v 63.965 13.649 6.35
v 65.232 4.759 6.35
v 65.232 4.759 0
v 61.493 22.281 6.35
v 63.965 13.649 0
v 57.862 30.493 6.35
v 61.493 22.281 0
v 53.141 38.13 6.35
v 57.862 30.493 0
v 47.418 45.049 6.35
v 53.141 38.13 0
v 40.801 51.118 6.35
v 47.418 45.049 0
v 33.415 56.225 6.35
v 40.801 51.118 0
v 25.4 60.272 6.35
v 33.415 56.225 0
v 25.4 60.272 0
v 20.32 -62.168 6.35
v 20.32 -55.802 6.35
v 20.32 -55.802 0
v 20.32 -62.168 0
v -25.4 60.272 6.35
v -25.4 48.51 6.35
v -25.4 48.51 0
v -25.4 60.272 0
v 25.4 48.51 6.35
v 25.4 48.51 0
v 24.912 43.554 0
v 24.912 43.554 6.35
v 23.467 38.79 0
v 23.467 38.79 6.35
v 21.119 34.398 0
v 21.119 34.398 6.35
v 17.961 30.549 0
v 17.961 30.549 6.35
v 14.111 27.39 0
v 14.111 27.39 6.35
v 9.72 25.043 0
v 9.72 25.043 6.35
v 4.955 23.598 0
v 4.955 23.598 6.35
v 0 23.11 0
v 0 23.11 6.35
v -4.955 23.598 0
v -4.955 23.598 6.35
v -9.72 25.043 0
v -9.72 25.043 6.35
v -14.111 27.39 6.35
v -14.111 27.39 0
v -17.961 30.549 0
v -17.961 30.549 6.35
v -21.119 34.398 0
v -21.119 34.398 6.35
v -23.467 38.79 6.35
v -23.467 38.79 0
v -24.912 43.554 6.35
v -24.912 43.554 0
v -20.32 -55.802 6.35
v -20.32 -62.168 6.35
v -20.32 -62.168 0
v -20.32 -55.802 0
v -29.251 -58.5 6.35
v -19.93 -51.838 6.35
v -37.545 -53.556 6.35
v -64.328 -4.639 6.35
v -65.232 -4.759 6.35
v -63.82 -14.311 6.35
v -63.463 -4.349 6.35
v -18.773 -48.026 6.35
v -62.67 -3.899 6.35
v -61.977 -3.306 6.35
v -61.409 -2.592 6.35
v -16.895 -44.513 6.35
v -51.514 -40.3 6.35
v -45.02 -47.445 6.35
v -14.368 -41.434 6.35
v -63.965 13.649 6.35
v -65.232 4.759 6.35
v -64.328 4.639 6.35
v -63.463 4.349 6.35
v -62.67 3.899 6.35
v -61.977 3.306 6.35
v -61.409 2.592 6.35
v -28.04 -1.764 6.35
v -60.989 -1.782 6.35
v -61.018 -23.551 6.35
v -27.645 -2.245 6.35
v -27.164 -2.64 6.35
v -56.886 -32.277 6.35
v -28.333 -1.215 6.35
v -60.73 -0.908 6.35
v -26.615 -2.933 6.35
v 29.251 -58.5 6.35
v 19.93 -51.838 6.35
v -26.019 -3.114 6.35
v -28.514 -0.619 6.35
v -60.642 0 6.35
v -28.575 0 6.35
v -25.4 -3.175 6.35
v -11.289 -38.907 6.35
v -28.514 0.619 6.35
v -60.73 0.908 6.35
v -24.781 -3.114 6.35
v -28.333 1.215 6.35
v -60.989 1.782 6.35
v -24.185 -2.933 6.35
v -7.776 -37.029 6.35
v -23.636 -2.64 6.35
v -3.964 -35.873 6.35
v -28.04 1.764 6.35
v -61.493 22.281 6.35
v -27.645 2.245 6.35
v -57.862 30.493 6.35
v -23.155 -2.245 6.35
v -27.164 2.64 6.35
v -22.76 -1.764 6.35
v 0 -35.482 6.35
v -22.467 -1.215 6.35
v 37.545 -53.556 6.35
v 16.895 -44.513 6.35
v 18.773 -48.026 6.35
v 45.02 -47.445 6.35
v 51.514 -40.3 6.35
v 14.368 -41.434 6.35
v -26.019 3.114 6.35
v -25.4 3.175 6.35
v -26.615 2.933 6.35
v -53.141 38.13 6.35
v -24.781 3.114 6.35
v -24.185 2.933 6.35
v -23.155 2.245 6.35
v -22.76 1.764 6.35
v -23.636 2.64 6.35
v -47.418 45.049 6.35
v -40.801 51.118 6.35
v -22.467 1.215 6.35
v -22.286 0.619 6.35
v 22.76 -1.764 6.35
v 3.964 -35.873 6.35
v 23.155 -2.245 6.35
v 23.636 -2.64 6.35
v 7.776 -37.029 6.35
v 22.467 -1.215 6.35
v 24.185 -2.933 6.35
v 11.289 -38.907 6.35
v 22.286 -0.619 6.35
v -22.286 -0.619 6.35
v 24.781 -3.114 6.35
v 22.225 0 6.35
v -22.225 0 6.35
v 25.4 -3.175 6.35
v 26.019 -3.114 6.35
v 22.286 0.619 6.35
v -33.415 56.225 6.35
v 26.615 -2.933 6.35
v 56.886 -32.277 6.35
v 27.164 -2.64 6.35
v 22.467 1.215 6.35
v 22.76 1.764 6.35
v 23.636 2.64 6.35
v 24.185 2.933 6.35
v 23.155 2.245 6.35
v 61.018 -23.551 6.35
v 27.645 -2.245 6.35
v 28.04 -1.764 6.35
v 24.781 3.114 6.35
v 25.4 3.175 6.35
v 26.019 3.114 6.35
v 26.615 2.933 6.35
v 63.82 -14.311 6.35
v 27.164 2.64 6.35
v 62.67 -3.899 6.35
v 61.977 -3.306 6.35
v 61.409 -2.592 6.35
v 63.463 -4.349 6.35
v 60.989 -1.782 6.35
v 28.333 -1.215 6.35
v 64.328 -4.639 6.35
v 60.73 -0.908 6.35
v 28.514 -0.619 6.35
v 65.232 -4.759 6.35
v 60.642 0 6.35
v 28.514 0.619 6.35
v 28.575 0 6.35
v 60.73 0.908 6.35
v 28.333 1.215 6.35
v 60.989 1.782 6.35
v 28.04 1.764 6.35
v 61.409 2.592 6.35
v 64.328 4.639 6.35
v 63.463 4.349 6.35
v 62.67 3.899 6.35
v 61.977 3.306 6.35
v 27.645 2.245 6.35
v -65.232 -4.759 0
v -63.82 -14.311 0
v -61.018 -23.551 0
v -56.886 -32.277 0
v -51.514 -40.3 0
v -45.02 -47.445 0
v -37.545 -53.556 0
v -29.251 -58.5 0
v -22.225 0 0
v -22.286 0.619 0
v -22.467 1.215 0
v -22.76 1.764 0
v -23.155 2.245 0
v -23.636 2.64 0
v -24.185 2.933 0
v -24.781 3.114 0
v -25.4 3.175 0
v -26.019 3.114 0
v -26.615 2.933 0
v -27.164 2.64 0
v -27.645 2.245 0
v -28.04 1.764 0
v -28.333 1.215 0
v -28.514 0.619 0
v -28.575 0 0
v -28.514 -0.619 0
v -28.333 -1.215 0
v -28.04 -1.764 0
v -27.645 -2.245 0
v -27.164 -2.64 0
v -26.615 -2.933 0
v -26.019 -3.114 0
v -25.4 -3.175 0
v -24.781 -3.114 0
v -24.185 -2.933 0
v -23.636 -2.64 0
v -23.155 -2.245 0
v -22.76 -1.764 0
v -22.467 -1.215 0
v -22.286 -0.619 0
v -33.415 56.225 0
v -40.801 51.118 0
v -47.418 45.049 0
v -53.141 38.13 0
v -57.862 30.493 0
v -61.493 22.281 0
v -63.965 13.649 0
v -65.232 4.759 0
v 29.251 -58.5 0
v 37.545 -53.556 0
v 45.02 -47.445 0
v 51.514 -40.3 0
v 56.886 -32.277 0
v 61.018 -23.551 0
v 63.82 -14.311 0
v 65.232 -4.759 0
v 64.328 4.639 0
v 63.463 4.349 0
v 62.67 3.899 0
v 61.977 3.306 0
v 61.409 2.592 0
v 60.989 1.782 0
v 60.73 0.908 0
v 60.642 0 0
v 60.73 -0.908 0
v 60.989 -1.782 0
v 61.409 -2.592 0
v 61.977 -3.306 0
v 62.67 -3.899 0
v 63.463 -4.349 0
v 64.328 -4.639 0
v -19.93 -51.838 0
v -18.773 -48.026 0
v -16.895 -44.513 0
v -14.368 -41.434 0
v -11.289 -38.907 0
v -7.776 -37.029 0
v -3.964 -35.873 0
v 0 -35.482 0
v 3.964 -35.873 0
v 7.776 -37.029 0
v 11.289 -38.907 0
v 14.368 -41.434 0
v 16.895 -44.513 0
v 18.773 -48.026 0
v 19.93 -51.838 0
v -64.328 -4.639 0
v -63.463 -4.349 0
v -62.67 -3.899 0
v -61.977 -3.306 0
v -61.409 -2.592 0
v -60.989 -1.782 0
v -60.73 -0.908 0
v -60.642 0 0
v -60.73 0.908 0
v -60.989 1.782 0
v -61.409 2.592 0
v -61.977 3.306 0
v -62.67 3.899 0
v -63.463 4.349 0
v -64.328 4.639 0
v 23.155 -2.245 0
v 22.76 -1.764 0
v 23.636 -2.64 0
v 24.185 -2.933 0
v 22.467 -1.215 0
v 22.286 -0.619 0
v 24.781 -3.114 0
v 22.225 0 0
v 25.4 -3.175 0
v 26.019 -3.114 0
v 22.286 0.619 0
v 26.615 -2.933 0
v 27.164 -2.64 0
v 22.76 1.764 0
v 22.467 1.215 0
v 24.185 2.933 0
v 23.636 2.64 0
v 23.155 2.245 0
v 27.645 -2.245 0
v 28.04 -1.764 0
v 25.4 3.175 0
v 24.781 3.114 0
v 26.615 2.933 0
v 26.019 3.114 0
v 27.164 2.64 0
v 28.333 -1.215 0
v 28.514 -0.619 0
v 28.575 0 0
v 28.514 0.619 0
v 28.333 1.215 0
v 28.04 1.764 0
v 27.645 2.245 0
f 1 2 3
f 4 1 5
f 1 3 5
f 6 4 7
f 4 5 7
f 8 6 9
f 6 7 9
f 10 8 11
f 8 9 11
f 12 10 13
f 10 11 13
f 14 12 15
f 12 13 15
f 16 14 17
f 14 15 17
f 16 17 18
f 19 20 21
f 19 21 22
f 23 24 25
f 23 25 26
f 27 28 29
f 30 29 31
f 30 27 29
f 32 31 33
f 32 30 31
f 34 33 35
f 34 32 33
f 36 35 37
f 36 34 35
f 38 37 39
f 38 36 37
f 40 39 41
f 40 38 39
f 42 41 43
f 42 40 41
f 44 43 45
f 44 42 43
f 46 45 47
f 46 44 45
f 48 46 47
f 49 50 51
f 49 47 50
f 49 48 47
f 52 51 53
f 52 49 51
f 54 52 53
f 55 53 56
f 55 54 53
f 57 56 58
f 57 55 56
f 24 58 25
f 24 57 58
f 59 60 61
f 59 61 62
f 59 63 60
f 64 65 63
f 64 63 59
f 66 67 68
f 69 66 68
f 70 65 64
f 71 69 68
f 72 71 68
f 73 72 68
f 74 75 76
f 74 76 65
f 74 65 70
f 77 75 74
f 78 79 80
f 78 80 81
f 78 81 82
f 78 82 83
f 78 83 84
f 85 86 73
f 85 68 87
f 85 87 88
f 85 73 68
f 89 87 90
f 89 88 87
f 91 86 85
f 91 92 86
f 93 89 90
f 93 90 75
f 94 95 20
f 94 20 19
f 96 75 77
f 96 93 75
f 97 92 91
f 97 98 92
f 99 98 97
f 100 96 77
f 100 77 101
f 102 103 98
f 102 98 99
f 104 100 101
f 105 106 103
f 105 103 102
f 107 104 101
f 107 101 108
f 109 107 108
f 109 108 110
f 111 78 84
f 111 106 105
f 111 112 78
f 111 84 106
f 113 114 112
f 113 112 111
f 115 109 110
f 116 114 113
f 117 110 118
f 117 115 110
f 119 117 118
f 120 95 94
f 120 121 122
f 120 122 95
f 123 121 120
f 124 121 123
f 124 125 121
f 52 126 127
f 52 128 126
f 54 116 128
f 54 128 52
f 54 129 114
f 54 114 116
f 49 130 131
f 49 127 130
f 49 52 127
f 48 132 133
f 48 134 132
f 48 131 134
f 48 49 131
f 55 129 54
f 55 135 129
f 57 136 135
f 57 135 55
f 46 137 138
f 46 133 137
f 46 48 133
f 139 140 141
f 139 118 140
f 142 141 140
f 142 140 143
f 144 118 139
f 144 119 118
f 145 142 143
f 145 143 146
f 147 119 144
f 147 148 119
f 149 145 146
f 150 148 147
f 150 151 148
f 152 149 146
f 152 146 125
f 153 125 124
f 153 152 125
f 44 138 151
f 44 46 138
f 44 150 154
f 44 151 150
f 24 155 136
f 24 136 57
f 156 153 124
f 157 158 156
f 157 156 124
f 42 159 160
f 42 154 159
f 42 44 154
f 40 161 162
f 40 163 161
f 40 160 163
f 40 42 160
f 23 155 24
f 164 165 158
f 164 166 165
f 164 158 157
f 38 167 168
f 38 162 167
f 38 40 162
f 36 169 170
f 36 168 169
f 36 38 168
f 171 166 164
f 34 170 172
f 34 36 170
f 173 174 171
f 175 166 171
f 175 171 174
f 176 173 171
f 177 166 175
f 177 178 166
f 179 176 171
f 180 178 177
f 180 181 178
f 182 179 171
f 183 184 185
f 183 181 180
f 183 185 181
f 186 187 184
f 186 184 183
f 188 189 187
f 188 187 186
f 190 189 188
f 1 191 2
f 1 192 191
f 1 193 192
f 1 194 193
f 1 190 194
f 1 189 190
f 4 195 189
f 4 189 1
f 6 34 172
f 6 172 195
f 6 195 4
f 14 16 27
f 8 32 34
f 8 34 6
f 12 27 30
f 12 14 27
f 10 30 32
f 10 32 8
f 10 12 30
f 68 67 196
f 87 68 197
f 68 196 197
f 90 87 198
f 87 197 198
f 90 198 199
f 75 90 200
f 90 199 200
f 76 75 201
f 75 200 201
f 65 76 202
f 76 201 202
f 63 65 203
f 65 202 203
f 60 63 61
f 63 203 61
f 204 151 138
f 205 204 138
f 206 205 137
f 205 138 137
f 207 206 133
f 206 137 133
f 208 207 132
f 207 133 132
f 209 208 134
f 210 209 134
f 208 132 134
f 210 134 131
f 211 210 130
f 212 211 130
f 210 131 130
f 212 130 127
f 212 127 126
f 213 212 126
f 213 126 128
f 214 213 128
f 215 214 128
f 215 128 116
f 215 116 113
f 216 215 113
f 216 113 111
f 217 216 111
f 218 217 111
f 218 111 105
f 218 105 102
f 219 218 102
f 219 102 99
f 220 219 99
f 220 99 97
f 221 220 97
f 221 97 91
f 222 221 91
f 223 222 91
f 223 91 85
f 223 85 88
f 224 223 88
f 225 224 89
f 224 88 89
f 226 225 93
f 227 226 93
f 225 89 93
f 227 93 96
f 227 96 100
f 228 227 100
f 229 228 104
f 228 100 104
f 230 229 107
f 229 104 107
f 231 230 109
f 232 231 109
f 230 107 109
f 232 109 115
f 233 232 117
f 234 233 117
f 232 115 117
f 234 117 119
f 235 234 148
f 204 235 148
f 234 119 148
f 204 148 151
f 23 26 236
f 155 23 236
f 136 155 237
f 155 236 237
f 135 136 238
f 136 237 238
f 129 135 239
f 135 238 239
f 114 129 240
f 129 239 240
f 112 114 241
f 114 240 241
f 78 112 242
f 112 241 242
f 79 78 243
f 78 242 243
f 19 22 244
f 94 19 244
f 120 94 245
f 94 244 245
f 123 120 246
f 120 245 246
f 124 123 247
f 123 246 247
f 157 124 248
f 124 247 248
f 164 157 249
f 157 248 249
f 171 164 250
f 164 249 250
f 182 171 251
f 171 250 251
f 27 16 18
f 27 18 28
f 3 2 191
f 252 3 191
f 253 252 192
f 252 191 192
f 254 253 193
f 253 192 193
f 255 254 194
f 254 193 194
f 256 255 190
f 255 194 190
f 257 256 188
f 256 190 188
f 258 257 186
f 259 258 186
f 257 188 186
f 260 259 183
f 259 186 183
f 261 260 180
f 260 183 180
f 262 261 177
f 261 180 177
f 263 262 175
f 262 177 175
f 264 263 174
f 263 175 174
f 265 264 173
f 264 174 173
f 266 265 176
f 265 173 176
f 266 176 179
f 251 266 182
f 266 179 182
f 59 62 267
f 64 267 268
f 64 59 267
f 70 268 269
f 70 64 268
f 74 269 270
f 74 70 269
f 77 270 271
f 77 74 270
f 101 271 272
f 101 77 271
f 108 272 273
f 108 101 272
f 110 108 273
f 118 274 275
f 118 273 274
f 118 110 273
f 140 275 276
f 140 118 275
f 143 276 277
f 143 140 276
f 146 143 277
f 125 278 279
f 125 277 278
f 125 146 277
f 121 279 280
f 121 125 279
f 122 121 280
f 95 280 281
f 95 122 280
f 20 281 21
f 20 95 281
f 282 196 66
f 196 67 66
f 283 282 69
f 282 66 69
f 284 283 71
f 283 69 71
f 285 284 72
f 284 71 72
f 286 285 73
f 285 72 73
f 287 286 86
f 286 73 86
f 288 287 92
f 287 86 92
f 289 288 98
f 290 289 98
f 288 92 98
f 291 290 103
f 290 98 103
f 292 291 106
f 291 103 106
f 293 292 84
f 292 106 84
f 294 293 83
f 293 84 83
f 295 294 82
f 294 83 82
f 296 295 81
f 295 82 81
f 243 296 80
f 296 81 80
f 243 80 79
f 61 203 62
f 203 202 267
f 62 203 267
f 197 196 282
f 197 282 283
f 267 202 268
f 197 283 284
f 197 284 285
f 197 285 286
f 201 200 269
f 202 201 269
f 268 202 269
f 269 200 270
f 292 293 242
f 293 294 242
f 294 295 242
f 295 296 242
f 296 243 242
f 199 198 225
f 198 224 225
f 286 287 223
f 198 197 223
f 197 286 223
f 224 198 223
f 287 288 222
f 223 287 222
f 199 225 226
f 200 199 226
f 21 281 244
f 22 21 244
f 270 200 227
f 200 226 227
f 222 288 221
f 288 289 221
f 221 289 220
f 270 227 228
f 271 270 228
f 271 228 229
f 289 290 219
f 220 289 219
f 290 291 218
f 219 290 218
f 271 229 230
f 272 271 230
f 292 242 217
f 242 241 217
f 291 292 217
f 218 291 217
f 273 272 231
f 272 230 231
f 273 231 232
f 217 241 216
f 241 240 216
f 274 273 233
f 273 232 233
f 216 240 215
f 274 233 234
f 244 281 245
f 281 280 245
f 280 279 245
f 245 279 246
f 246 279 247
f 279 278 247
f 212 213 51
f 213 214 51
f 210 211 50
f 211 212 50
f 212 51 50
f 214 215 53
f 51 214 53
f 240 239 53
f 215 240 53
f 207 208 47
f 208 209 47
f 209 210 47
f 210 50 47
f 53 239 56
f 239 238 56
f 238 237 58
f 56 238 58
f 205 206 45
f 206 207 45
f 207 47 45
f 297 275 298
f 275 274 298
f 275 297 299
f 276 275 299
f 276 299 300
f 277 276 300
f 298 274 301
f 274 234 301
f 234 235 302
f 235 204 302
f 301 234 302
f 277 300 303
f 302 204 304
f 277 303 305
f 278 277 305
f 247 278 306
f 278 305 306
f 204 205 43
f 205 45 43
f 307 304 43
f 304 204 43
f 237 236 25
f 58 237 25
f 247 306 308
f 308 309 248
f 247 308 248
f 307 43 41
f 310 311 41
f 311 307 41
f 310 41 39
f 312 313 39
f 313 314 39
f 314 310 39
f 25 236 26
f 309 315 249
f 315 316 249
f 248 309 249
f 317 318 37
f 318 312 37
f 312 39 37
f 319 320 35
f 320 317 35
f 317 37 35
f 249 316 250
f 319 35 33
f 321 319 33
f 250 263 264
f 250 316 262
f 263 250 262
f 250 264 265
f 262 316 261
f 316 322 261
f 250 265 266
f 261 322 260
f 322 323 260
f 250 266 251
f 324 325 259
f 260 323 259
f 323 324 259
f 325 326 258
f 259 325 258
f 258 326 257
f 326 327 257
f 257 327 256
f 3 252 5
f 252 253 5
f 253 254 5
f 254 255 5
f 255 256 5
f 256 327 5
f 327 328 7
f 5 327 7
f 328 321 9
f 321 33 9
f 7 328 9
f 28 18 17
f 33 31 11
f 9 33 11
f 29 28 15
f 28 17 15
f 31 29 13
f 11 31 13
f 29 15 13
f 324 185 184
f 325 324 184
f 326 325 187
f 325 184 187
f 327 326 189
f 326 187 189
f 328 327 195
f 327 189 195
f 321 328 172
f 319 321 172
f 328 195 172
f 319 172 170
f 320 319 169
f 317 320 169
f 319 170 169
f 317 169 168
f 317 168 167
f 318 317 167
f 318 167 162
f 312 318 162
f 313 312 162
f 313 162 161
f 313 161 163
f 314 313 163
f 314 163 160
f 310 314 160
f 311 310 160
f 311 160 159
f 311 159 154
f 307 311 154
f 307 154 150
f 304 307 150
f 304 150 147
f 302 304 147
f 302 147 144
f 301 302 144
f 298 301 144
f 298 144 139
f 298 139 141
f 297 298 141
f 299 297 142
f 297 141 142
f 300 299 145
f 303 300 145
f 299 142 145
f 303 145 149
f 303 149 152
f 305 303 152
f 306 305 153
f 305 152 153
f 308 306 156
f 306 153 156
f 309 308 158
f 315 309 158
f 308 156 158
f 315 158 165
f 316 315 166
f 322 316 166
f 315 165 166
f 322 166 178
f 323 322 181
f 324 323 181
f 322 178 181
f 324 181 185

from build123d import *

# Parameters (mm, degrees)
SKETCH1_R      = 65.405
EXTRUDE1_DEPTH = 6.35
SKETCH2_R      = 4.7625
SKETCH2_R_2    = 3.175
EXTRUDE2_DEPTH = 93.714349213


with BuildPart() as part:
    # Sketch1 → Extrude1 (new body)
    with BuildSketch(Plane.XY):
        Circle(SKETCH1_R)
    extrude(amount=EXTRUDE1_DEPTH)

    # Sketch2 → Extrude2 (cut, through all)
    with BuildSketch(Plane.XY.offset(6.35)):
        with Locations((-65.405, 0)):
            Circle(SKETCH2_R)
        with Locations((65.405, 0)):
            Circle(SKETCH2_R)
        with Locations((25.4, 0)):
            Circle(SKETCH2_R_2)
        with Locations((-25.4, 0)):
            Circle(SKETCH2_R_2)
        with BuildLine():
            Line((-25.4, 48.509773864), (-25.4, 60.271502595))
            Line((-25.4, 60.271502595), (-25.4, 90.805))
            Line((-25.4, 90.805), (25.4, 90.805))
            Line((25.4, 90.805), (25.4, 60.271502595))
            Line((25.4, 60.271502595), (25.4, 48.509773864))
            ThreePointArc((25.4, 48.509773864), (0, 23.109773864), (-25.4, 48.509773864))
        make_face()
        with BuildLine():
            Line((20.32, -55.802214755), (20.32, -68.502214755))
            Line((20.32, -68.502214755), (-20.32, -68.502214755))
            Line((-20.32, -68.502214755), (-20.32, -55.802214755))
            ThreePointArc((-20.32, -55.802214755), (0, -35.482214755), (20.32, -55.802214755))
        make_face()
    extrude(amount=-EXTRUDE2_DEPTH, mode=Mode.SUBTRACT)


solid = part.part
